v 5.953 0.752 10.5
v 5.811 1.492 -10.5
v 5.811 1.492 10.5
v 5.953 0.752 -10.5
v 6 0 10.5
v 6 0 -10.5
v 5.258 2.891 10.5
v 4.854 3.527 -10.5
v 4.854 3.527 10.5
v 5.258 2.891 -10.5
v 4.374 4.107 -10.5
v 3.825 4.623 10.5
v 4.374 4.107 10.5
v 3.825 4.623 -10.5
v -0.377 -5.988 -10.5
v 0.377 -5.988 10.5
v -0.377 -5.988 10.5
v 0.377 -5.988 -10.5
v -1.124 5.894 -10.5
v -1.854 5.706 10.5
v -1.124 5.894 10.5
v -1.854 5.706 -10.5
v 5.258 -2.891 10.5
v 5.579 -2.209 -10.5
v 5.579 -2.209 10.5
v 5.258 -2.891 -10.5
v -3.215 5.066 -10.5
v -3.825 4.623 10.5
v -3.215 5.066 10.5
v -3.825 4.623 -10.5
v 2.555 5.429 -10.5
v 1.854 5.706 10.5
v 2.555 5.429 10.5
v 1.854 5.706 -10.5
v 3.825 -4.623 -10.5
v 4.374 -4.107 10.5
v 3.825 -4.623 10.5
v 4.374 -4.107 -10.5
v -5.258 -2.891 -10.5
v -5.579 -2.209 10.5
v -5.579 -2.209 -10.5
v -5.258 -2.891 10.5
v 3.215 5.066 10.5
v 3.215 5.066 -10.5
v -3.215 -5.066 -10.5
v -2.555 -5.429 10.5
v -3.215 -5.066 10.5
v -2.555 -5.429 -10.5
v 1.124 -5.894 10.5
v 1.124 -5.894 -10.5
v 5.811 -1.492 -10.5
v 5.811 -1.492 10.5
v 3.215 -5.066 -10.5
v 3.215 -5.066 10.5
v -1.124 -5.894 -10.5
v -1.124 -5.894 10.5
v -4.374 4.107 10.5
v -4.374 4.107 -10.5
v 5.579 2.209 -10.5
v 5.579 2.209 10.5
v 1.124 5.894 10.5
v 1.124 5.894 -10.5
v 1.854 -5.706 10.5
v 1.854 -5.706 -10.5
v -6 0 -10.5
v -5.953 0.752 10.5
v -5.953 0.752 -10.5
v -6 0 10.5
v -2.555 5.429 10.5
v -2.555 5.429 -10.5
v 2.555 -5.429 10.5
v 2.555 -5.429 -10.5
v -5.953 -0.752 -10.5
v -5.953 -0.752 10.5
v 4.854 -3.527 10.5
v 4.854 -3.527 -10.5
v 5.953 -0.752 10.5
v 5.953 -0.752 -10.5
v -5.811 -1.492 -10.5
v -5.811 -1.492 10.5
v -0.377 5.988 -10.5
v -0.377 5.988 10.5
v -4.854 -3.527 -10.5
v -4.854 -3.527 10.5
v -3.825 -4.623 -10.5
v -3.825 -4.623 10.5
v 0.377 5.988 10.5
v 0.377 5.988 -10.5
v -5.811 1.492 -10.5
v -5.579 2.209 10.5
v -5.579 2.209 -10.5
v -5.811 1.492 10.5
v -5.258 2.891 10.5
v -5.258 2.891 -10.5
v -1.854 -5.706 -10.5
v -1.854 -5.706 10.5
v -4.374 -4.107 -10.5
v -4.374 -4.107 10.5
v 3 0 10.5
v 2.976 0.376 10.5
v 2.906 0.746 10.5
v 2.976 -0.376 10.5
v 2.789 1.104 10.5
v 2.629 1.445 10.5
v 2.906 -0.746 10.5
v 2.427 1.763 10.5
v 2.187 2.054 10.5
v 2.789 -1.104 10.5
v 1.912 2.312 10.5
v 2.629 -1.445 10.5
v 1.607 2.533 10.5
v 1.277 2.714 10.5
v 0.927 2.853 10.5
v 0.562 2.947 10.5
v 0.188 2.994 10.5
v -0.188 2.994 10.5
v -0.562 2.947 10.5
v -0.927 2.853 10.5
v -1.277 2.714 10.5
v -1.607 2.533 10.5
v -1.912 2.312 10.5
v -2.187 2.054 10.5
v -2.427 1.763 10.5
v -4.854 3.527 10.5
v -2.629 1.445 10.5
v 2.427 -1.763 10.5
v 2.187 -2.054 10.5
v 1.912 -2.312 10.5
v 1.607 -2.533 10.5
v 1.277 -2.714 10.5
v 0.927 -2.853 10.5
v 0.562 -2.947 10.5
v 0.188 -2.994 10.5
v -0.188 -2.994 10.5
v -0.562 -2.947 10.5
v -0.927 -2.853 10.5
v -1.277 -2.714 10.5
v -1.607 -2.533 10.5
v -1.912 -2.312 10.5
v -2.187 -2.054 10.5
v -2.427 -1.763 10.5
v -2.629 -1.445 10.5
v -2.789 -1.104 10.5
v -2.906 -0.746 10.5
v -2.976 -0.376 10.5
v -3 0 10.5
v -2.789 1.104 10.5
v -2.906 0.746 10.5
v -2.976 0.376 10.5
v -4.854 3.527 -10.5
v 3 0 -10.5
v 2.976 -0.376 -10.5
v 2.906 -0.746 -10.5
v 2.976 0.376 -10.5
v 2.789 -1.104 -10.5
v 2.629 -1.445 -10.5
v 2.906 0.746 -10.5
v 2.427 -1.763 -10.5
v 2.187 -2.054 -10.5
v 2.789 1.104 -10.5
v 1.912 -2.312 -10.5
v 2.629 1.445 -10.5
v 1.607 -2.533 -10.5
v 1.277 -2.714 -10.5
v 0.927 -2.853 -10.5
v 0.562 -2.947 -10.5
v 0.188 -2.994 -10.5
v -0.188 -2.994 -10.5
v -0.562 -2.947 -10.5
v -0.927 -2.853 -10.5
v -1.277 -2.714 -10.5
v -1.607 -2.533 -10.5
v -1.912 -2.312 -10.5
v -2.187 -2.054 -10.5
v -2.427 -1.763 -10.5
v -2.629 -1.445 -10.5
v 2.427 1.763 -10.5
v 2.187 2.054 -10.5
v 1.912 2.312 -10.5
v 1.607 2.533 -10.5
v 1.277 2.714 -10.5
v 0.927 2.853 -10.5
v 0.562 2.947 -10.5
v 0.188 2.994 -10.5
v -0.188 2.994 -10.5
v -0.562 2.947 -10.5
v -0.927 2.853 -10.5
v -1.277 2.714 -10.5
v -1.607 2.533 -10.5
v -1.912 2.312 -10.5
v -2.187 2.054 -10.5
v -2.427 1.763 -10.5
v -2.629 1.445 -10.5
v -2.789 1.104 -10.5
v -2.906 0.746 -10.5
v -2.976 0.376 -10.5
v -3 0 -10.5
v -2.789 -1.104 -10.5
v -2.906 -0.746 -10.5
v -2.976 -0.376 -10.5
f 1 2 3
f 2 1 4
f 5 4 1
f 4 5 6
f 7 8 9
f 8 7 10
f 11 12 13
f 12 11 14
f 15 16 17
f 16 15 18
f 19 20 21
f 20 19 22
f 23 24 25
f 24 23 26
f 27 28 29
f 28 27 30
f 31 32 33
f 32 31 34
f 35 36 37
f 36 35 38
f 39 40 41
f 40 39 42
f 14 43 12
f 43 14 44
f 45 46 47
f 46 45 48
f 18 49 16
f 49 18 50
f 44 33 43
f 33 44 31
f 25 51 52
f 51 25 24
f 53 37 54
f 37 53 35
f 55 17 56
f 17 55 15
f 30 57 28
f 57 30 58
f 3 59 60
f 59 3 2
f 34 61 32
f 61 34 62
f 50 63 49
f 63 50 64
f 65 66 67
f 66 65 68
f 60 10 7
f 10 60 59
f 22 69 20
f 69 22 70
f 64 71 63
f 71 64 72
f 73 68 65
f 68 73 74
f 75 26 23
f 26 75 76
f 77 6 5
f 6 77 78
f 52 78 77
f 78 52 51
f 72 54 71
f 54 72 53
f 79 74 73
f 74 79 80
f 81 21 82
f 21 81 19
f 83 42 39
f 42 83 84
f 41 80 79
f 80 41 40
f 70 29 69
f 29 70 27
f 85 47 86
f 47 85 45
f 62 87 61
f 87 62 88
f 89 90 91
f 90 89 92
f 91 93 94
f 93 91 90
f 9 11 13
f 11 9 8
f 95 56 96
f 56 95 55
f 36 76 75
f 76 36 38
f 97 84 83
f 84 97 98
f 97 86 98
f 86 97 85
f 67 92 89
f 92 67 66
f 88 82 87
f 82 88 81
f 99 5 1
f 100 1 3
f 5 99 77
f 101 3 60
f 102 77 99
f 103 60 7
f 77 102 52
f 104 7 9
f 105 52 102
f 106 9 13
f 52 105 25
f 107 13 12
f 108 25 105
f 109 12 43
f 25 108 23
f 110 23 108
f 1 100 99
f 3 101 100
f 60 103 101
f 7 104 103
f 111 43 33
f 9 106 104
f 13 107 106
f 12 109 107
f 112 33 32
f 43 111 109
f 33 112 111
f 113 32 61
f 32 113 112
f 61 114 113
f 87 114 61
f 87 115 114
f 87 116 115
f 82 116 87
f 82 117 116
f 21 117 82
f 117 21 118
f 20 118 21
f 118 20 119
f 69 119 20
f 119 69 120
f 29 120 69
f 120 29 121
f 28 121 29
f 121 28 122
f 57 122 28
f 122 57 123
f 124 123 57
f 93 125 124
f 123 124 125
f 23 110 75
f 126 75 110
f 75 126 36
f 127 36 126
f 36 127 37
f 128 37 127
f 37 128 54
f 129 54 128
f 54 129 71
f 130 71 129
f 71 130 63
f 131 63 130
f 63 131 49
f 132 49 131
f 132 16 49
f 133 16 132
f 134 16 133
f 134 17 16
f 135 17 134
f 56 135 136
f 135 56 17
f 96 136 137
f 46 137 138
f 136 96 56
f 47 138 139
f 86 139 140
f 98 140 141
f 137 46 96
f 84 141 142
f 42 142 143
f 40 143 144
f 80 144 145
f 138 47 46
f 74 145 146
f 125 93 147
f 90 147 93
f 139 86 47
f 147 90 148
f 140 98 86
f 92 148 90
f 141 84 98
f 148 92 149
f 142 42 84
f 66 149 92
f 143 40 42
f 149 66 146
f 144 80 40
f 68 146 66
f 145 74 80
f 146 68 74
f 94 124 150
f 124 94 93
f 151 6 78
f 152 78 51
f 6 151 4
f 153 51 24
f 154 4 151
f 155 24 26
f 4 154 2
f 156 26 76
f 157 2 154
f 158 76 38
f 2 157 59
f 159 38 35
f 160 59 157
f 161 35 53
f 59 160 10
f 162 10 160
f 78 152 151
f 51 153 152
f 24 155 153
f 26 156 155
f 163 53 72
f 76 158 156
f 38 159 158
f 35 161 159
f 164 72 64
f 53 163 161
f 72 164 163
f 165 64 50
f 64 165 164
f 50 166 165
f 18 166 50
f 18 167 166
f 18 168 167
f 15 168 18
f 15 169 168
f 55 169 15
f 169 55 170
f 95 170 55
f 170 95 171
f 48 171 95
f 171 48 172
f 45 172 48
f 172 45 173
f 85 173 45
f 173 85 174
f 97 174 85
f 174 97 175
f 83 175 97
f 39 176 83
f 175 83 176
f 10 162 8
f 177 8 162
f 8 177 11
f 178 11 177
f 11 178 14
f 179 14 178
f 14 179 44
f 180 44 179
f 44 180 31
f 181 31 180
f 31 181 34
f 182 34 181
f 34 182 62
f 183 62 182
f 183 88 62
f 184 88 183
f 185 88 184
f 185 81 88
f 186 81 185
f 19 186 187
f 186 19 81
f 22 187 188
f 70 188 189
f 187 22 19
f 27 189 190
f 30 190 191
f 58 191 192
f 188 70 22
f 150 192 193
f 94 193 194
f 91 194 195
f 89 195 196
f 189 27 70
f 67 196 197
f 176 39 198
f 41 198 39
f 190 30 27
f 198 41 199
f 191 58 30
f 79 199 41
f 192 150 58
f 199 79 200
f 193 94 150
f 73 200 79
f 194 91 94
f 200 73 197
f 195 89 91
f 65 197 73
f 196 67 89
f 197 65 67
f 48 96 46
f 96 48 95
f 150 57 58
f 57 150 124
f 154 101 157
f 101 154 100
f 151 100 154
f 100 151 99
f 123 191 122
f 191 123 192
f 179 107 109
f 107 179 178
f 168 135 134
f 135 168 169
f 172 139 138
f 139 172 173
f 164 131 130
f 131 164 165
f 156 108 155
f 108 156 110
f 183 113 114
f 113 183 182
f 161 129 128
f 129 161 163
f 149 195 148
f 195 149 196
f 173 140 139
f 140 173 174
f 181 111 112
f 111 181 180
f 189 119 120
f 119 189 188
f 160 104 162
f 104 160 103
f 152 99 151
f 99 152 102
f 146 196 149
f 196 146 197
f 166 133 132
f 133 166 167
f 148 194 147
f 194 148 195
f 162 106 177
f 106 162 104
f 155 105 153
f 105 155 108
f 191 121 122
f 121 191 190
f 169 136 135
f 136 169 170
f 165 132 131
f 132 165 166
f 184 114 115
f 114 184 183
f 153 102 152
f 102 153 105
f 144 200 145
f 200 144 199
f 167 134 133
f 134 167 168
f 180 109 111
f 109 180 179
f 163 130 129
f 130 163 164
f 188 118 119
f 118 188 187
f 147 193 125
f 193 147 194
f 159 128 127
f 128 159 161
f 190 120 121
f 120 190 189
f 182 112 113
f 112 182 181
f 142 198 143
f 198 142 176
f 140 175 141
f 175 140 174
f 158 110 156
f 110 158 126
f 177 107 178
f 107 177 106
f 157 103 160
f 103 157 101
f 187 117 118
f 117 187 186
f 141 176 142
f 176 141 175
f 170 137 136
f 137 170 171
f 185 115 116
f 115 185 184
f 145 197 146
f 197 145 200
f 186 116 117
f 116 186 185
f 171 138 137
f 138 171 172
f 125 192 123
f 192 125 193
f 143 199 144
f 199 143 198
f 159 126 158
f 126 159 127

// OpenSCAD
$fn = 50;


difference() {
	union() {
		translate(v = [0, 0, -10.5000000000]) {
			cylinder(h = 21, r = 6.0000000000);
		}
	}
	union() {
		translate(v = [0, 0, -100.0000000000]) {
			cylinder(h = 200, r = 3.0000000000);
		}
	}
}
